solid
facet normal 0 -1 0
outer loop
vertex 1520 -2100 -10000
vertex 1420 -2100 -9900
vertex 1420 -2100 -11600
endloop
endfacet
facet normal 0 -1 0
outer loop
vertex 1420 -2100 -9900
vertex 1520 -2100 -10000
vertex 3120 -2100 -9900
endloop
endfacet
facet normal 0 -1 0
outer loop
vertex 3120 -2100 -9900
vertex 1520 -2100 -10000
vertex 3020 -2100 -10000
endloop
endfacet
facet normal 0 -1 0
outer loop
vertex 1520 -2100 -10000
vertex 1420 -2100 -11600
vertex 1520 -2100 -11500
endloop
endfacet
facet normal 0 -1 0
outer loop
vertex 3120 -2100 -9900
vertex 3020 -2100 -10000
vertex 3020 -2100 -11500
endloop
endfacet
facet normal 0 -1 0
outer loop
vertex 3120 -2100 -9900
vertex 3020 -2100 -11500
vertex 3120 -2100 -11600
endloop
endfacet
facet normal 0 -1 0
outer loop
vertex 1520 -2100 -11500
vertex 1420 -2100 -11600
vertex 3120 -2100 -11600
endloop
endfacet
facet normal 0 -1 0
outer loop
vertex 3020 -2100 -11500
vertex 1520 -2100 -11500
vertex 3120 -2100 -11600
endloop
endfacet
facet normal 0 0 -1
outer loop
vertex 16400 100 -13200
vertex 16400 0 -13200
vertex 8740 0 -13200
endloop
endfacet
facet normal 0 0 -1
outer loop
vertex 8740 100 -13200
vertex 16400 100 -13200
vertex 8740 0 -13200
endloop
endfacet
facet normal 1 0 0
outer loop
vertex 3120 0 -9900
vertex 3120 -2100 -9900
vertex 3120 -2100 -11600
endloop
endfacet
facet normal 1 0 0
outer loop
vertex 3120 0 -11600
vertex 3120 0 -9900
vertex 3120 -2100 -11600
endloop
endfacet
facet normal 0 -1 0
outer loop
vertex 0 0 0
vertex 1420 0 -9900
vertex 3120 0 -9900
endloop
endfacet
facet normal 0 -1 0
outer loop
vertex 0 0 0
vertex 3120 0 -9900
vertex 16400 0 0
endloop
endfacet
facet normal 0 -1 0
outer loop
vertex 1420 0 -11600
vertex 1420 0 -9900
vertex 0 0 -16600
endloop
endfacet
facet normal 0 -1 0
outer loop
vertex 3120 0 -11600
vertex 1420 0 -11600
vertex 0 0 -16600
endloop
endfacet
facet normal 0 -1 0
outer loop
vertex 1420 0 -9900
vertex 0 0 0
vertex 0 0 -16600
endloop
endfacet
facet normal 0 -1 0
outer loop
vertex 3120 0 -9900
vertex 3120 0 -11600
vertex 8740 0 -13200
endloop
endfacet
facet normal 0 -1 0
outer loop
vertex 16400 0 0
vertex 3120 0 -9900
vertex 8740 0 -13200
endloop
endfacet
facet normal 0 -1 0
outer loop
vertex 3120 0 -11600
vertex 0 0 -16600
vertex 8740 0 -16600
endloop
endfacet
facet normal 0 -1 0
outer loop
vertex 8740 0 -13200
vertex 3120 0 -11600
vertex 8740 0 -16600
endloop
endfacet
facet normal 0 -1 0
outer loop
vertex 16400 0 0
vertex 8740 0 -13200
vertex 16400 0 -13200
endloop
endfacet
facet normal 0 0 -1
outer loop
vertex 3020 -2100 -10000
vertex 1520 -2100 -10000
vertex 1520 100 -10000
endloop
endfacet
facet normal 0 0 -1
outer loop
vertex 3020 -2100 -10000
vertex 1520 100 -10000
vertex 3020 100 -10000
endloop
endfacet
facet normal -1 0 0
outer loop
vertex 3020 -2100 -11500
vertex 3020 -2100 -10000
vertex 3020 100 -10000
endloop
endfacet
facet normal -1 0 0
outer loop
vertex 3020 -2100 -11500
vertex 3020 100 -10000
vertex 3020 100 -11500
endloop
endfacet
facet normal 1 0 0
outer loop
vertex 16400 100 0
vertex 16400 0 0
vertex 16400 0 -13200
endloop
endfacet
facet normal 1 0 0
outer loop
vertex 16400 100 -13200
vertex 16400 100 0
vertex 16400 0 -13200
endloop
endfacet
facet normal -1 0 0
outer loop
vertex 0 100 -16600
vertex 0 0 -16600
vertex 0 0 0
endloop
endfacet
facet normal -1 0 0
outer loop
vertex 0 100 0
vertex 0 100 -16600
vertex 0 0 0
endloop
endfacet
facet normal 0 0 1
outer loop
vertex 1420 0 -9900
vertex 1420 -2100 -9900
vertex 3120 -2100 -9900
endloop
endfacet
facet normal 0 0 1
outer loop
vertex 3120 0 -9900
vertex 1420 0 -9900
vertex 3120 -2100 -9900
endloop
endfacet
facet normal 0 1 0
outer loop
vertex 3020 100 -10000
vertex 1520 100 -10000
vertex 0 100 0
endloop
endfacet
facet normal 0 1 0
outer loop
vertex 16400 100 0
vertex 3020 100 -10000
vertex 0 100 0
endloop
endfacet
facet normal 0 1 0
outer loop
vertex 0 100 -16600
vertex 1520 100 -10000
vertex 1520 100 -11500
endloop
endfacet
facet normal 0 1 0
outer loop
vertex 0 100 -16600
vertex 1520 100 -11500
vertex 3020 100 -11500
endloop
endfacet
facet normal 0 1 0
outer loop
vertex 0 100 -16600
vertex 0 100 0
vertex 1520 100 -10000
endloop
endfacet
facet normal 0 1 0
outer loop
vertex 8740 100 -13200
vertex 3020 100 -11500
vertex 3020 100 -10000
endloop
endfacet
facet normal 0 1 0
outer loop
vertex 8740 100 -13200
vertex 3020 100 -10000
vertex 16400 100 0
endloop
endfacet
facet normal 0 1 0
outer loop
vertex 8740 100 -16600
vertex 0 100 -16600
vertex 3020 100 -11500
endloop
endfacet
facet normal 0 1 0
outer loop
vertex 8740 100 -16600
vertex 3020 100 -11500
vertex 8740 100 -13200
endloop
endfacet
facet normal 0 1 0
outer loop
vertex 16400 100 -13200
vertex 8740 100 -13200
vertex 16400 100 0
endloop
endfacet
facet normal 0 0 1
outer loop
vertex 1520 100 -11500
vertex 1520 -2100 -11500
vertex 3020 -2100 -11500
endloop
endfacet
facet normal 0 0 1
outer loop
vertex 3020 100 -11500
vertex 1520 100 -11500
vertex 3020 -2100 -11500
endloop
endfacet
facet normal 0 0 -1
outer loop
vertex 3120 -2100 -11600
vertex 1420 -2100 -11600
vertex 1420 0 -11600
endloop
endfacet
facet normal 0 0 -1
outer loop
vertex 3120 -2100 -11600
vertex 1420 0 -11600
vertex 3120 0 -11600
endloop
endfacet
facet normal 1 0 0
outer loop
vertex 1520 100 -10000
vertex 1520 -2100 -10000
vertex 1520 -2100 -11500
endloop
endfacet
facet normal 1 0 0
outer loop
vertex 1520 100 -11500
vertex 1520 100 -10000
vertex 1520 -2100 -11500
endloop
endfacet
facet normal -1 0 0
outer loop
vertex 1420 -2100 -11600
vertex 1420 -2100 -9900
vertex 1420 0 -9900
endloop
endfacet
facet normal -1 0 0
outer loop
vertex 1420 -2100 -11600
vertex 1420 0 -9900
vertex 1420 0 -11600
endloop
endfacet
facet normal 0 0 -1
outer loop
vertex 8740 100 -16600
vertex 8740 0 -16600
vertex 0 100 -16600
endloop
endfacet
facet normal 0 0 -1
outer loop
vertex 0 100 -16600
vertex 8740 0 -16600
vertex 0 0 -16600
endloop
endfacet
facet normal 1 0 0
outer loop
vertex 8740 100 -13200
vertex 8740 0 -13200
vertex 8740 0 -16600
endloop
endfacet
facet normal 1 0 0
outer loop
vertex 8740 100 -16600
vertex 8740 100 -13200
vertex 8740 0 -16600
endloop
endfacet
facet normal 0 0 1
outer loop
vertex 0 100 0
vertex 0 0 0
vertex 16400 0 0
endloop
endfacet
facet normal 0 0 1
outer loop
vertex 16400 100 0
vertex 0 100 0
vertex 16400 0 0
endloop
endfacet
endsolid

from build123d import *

# Parameters (mm, degrees)
EXTRUDE_1_DEPTH     = 100
SKETCH_5_W          = 1700
SKETCH_5_H          = 1700
SKETCH_5_W_2        = 1500
SKETCH_5_H_2        = 1500
EXTRUDE_3_DEPTH     = 2200
SKETCH_5_3_W        = 1500
SKETCH_5_3_H        = 1500
CUT_EXTRUDE_3_DEPTH = 2200


with BuildPart() as part:
    # Эскиз1 → Вытянуть1 (new body)
    with BuildSketch(Plane(origin=(0, 0, 0), x_dir=(1, 0, 0), z_dir=(0, 1, 0))):
        Polygon((16400, 13200), (8740, 13200), (8740, 16600), (0, 16600), (0, 0), (16400, 0), align=None)
    extrude(amount=EXTRUDE_1_DEPTH)

    # Эскиз5 → Вытянуть-Тонкостенный3 (add)
    with BuildSketch(Plane(origin=(0, 100, 0), x_dir=(1, 0, 0), z_dir=(0, 1, 0))):
        with Locations((2270, 10750)):
            Rectangle(SKETCH_5_W, SKETCH_5_H)
        with Locations((2270, 10750)):
            Rectangle(SKETCH_5_W_2, SKETCH_5_H_2, mode=Mode.SUBTRACT)
    extrude(amount=-EXTRUDE_3_DEPTH)

    # Эскиз5<3> → Вытянуть3 (cut)
    with BuildSketch(Plane(origin=(0, 100, 0), x_dir=(1, 0, 0), z_dir=(0, 1, 0))):
        with Locations((2270, 10750)):
            Rectangle(SKETCH_5_3_W, SKETCH_5_3_H)
    extrude(amount=-CUT_EXTRUDE_3_DEPTH, mode=Mode.SUBTRACT)


solid = part.part
